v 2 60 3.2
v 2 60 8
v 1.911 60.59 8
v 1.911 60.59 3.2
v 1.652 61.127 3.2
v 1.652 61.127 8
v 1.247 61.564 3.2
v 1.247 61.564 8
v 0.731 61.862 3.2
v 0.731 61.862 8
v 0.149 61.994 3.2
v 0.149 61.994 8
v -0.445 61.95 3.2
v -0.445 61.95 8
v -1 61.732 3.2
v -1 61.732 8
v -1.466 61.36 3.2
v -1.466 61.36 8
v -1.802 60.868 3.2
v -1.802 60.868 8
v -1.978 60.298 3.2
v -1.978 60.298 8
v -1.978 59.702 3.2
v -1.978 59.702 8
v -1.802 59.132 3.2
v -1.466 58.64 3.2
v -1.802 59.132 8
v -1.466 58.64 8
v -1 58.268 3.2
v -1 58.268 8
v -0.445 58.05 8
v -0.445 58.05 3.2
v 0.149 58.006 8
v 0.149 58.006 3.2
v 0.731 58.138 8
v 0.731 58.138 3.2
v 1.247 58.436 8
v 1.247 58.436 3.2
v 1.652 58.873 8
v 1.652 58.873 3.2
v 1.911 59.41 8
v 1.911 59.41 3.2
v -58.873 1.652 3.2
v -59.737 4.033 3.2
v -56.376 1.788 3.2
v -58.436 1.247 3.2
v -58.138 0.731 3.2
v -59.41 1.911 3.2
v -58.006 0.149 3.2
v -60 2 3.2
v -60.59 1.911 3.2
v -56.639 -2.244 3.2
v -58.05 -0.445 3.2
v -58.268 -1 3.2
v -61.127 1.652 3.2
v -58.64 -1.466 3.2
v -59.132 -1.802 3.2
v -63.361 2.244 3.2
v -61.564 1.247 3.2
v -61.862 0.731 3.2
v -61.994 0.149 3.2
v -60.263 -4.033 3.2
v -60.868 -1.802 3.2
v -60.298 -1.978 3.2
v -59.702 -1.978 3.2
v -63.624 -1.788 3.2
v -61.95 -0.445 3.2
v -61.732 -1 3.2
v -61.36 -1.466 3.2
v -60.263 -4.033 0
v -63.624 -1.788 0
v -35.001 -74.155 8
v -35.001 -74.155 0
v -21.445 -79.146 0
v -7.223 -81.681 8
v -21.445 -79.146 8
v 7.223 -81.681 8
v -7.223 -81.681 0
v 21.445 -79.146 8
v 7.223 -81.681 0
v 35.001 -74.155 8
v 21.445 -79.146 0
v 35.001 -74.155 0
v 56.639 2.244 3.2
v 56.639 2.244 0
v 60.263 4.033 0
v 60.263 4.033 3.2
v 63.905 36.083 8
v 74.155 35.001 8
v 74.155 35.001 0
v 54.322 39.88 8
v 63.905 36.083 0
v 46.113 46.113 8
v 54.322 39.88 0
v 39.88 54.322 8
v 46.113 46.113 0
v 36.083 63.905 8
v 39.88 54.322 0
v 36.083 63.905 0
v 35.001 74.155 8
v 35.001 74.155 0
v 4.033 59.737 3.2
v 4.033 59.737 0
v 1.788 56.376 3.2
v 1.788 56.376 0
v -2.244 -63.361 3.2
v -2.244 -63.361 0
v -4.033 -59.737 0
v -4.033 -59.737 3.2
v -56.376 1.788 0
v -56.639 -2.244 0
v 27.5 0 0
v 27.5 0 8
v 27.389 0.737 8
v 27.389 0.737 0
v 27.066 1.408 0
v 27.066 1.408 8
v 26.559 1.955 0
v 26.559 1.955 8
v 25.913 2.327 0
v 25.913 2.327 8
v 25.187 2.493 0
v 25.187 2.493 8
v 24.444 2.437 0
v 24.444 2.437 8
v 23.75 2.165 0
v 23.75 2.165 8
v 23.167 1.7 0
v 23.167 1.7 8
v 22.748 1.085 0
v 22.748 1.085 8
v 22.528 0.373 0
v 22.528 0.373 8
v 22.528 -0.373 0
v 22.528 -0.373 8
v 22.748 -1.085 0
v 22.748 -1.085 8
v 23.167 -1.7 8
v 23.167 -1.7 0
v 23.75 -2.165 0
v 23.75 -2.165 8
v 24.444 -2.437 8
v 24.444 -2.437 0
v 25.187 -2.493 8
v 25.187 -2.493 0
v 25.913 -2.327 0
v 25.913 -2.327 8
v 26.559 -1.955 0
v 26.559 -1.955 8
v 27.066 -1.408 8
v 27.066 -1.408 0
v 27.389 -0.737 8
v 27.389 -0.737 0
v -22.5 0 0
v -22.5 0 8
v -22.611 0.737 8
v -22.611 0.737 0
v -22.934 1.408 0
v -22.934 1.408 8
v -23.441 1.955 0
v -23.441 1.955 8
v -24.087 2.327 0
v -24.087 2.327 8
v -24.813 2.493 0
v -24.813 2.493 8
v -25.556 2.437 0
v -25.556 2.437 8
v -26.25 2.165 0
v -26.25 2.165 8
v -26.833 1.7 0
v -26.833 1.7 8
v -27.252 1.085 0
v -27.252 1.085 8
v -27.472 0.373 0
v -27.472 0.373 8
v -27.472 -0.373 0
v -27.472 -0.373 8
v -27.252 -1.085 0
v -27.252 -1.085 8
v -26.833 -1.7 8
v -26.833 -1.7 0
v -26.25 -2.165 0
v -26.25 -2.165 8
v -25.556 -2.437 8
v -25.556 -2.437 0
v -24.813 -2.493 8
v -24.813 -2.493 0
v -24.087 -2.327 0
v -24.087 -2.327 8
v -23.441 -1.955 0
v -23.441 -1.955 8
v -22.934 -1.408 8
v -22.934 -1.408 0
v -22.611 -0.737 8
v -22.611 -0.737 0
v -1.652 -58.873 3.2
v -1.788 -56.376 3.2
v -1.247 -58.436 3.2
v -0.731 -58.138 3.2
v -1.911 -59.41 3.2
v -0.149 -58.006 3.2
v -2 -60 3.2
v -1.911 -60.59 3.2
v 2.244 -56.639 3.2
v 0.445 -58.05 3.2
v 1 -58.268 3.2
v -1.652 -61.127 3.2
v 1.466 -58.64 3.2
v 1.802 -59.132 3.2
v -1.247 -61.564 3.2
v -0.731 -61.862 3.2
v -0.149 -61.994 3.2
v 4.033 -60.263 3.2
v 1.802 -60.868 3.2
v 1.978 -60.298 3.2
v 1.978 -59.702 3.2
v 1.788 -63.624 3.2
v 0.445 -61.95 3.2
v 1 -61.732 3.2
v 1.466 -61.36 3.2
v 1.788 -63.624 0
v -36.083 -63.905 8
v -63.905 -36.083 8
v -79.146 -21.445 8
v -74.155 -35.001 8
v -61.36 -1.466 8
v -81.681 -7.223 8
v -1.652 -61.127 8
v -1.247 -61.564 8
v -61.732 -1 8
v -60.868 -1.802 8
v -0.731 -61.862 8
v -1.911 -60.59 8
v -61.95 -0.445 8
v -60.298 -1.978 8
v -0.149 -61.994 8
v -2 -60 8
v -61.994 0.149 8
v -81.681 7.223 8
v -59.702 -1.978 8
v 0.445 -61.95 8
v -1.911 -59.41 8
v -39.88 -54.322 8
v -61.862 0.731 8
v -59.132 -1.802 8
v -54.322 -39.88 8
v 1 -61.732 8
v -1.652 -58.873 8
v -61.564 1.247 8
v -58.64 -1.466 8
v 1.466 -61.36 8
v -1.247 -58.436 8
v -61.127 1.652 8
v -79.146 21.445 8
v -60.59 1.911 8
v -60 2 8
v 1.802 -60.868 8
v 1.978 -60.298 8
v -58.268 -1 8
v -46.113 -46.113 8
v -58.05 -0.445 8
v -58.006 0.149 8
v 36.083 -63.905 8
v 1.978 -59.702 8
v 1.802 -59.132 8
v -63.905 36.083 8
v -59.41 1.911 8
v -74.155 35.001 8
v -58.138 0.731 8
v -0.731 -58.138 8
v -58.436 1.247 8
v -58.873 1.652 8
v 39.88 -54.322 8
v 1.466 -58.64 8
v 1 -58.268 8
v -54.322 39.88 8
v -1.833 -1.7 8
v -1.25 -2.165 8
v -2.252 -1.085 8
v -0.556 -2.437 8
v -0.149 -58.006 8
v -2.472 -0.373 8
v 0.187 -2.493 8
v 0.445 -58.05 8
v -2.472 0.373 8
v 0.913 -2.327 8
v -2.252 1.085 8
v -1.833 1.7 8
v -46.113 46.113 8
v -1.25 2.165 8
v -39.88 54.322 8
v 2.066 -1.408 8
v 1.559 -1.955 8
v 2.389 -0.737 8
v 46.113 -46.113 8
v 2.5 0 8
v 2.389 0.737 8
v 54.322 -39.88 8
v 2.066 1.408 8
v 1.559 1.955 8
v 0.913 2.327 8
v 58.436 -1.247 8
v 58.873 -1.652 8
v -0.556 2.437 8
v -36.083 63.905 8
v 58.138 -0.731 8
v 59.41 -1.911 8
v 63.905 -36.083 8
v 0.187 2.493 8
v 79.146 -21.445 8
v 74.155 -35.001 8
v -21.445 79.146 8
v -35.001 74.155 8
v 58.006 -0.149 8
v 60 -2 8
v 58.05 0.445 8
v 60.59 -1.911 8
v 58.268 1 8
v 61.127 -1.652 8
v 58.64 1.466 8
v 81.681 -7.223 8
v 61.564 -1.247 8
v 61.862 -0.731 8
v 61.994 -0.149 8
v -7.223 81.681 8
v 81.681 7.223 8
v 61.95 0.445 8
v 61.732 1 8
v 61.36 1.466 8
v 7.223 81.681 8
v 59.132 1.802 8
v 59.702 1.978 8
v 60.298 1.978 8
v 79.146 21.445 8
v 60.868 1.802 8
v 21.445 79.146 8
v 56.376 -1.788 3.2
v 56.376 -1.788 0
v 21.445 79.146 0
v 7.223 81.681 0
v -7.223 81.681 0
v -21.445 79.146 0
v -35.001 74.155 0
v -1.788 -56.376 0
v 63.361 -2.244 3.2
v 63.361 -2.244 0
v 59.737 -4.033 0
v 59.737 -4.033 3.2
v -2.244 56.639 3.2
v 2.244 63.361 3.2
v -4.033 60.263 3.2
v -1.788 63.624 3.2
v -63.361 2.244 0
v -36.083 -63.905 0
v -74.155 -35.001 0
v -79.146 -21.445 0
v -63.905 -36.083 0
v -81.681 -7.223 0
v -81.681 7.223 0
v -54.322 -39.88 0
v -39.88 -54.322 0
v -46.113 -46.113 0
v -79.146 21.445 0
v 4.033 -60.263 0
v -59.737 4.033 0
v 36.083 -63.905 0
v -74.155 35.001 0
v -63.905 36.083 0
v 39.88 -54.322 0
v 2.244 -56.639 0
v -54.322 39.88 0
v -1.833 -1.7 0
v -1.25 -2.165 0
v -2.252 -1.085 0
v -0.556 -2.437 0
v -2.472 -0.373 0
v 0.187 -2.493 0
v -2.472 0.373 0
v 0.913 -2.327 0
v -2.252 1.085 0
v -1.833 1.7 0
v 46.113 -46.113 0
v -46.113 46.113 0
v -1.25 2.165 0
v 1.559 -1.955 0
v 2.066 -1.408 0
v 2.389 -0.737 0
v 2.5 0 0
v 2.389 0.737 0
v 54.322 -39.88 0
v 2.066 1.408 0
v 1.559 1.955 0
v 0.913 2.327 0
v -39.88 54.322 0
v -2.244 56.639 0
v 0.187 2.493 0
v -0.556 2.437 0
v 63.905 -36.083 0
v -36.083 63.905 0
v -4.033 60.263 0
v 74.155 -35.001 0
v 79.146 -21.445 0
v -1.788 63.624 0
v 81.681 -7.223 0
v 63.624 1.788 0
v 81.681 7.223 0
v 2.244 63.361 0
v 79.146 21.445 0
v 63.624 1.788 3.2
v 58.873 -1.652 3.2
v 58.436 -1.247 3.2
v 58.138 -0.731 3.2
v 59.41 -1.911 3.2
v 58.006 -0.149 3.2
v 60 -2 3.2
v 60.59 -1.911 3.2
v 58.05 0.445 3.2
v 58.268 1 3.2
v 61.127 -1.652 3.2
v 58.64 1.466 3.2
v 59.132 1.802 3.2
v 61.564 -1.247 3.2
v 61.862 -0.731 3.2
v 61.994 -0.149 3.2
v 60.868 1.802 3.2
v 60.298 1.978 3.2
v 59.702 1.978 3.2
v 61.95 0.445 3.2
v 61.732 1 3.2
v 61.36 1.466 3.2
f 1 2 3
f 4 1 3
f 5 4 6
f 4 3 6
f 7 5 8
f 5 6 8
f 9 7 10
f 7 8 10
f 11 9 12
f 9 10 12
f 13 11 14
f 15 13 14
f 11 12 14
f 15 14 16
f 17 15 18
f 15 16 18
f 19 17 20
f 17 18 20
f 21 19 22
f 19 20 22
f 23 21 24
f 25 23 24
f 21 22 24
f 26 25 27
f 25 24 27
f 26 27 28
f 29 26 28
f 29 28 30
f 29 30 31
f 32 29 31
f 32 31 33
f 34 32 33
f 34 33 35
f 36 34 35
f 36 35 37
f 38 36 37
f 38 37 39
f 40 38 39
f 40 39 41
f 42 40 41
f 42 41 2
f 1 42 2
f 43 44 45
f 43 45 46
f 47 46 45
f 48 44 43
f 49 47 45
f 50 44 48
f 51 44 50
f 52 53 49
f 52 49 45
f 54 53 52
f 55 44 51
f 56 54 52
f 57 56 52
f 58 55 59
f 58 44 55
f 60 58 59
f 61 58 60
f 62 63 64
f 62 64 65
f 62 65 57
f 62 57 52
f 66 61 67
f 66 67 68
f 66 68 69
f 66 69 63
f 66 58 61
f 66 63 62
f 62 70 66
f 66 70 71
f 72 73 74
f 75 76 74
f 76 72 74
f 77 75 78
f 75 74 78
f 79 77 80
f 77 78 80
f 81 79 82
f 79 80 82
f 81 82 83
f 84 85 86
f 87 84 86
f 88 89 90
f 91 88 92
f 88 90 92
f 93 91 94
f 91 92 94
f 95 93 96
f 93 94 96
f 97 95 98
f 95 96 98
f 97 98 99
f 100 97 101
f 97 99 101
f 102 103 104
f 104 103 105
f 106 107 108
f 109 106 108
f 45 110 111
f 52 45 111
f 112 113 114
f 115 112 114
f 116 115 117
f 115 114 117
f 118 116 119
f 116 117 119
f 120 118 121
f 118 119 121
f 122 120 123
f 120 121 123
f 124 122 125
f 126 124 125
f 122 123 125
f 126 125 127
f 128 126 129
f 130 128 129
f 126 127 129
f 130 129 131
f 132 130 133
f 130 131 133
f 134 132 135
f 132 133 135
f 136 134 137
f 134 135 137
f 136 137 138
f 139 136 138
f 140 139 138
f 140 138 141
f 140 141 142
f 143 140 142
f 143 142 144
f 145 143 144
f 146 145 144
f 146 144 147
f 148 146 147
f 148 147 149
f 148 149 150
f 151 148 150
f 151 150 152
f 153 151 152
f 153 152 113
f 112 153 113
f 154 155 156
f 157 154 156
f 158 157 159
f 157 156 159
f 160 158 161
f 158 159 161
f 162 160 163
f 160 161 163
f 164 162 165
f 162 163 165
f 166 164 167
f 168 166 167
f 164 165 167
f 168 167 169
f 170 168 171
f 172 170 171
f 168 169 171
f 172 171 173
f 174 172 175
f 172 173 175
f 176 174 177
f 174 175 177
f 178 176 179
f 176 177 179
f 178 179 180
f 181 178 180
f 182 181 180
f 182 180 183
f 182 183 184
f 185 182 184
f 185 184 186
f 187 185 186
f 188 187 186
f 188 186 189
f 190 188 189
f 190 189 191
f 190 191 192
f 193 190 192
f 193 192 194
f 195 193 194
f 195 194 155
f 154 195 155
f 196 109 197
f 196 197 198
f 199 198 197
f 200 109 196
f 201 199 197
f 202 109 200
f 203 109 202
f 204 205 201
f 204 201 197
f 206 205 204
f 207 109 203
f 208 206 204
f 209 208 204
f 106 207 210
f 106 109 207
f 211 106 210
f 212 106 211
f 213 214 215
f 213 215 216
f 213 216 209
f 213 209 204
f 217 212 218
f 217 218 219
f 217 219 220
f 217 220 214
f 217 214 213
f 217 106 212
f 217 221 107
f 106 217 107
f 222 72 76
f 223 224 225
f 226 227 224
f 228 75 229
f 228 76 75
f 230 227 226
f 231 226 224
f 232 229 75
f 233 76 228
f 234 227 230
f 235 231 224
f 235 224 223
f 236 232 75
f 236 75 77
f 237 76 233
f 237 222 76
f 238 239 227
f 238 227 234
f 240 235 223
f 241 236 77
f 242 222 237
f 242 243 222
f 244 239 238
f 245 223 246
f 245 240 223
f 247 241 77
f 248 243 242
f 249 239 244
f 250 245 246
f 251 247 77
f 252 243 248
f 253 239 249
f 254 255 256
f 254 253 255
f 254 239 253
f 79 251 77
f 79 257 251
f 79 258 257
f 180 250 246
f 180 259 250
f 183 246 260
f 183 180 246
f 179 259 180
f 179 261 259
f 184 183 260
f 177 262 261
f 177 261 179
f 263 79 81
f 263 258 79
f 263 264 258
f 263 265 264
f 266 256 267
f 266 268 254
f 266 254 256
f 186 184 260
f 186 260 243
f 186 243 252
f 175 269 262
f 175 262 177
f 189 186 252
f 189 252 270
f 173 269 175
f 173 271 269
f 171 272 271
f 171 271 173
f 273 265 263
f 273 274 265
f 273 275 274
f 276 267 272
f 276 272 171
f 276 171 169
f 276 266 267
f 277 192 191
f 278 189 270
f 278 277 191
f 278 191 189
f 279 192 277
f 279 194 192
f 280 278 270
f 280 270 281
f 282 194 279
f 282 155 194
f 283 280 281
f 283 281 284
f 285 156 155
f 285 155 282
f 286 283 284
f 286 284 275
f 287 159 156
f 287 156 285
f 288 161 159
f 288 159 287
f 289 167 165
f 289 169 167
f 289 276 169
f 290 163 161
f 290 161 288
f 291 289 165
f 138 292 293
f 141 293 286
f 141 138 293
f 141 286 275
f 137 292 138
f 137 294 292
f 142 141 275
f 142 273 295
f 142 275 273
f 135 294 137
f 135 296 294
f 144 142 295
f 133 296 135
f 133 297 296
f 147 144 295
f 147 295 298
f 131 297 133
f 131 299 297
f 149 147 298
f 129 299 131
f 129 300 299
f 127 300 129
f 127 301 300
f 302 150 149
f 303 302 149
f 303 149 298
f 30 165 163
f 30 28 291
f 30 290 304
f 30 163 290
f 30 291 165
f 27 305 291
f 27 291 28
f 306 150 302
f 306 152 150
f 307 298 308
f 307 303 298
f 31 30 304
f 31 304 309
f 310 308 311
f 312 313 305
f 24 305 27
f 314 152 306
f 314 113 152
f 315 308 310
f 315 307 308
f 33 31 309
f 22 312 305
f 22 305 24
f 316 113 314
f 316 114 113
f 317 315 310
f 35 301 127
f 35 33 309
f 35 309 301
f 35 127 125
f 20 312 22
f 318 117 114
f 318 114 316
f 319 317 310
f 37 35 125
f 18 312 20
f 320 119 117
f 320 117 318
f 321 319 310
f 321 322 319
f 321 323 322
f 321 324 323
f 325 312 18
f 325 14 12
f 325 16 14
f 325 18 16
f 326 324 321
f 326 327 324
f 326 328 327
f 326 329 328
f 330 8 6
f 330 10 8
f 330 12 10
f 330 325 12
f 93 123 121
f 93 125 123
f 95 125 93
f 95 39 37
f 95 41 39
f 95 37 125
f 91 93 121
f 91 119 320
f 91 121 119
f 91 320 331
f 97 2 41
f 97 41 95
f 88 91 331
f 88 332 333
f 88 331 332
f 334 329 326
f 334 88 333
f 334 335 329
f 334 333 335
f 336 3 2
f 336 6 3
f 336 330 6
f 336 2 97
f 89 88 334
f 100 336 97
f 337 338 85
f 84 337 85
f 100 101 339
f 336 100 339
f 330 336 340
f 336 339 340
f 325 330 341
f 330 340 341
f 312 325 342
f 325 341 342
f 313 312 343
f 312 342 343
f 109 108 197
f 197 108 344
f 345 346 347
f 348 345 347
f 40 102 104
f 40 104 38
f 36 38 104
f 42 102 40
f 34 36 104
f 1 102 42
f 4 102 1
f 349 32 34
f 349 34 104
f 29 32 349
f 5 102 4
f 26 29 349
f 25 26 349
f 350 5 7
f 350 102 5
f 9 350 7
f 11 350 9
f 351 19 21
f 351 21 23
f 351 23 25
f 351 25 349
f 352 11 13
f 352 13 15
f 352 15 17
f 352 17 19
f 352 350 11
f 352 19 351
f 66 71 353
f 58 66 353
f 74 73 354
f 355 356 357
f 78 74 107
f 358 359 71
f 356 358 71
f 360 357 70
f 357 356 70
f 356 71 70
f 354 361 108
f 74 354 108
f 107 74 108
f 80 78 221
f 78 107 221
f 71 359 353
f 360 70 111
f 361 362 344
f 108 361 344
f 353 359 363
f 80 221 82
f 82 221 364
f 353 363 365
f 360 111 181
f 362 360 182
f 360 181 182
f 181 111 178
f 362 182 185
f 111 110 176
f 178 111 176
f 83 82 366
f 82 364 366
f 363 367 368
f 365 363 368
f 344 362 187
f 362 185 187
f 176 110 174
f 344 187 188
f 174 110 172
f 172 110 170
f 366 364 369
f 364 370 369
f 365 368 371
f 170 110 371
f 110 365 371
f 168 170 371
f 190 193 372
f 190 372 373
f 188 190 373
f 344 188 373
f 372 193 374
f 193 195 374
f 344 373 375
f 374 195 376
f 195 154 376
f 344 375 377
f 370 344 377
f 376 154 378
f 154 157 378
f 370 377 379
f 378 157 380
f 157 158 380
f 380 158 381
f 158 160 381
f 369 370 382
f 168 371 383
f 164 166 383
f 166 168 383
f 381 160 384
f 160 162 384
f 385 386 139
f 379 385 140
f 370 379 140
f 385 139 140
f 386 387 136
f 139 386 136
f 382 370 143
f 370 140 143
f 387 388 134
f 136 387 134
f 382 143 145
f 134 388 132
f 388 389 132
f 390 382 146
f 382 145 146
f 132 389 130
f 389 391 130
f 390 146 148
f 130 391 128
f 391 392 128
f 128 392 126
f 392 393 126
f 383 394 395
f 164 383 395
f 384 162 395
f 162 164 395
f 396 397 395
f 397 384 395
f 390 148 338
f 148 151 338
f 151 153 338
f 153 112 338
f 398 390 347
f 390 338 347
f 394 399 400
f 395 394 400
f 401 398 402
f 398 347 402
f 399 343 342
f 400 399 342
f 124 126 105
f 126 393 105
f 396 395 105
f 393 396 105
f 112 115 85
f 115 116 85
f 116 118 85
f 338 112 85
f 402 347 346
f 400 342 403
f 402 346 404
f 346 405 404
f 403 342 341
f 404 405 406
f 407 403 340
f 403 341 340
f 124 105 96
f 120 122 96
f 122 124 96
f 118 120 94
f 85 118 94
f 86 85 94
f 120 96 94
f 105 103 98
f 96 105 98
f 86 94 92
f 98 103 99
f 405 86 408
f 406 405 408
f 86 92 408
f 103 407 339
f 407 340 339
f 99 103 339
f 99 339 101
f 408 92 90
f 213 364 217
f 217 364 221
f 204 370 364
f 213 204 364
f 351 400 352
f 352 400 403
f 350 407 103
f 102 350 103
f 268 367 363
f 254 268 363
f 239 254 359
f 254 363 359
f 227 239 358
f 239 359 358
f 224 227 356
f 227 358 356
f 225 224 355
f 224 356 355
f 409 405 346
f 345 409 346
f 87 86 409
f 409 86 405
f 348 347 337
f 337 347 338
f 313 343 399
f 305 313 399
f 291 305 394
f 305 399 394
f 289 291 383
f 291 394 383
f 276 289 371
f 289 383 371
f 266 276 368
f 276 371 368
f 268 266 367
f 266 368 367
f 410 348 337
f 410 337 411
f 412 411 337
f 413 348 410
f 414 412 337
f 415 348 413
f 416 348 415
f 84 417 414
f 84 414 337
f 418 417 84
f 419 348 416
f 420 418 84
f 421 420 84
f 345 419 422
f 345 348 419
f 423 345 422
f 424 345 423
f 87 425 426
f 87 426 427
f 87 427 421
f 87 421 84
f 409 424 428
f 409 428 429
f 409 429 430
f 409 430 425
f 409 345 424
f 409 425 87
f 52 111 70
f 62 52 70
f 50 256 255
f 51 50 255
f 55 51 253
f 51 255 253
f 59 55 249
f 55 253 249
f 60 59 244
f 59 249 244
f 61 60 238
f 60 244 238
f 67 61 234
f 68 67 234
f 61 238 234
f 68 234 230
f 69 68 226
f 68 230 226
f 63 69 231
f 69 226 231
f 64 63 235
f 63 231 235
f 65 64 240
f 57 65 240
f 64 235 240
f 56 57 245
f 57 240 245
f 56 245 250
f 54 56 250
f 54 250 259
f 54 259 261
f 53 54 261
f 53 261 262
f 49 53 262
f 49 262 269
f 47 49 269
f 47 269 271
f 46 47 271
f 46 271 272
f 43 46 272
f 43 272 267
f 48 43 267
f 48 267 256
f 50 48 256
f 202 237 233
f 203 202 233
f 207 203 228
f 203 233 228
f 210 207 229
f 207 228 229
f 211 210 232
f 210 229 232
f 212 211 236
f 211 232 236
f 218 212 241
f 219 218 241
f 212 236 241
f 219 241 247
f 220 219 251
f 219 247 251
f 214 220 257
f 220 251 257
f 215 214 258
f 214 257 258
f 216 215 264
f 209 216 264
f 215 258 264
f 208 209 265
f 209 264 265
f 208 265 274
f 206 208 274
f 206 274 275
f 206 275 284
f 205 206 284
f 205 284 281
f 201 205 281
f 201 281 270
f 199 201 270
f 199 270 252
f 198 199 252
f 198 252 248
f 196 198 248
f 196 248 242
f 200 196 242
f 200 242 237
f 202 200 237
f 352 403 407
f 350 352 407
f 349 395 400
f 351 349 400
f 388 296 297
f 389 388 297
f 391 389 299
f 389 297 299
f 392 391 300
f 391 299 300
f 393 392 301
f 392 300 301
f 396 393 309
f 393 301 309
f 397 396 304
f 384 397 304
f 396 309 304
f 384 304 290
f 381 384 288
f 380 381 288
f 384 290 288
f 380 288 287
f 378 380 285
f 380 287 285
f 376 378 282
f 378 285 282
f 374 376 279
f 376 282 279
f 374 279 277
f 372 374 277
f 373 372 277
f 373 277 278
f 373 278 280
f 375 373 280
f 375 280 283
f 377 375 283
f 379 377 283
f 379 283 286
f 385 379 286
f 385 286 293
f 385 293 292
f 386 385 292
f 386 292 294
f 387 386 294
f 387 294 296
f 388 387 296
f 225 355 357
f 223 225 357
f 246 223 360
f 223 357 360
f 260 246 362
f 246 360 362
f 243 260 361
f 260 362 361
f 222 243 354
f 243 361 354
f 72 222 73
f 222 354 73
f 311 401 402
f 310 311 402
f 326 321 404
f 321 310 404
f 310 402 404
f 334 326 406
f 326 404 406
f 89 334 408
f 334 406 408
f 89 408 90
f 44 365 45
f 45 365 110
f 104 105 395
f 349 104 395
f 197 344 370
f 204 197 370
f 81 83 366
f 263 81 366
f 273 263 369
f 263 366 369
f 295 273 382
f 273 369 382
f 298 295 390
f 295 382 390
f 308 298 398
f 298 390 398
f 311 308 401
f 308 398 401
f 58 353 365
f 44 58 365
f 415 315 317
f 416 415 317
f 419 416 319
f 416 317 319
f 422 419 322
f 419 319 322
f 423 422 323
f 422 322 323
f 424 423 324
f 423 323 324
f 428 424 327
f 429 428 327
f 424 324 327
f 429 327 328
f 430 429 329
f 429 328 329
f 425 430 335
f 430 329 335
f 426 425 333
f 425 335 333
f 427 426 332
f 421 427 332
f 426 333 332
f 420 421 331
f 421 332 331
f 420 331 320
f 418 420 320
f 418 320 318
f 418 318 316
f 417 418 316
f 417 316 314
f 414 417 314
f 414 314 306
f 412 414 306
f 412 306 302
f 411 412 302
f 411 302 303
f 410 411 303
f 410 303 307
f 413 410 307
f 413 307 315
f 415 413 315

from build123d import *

# Parameters (mm, degrees)
SKETCH1_R           = 82
BOSS_EXTRUDE1_DEPTH = 8
SKETCH2_R           = 2
CUT_EXTRUDE1_DEPTH  = 15
CIRPATTERN2_COUNT   = 4
CUT_EXTRUDE3_DEPTH  = 3.2
CIRPATTERN3_COUNT   = 4
SKETCH10_R          = 2.5
CUT_EXTRUDE4_DEPTH  = 10
CUT_EXTRUDE5_START  = -10
CUT_EXTRUDE5_DEPTH  = 10
CIRPATTERN4_COUNT   = 4


with BuildPart() as part:
    # Sketch1 → Boss-Extrude1 (new body)
    with BuildSketch(Plane.XY):
        Circle(SKETCH1_R)
    extrude(amount=BOSS_EXTRUDE1_DEPTH)

    # Sketch2 → Cut-Extrude1 (cut)
    with BuildSketch(Plane.XY.offset(8)):
        with Locations((0, 60)):
            Circle(SKETCH2_R)
    cut_extrude1 = extrude(amount=-CUT_EXTRUDE1_DEPTH, mode=Mode.SUBTRACT)

    # CirPattern2: Cut-Extrude1 ×4 about axis
    cirpattern2_axis = Axis((0, 0, 0), (0, 0, 1))
    for i in range(1, CIRPATTERN2_COUNT):
        add(cut_extrude1.rotate(cirpattern2_axis, i * 360 / CIRPATTERN2_COUNT), mode=Mode.SUBTRACT)

    # Sketch7 → Cut-Extrude3 (cut)
    with BuildSketch(Plane(origin=(0, 0, 0), x_dir=(-1, 0, 0), z_dir=(0, 0, -1))):
        Polygon((1.788462671, 63.624187441), (-2.244407056, 63.360947827), (-4.032869728, 59.736760386), (-1.788462671, 56.375812559), (2.244407056, 56.639052173), (4.032869728, 60.263239614), align=None)
    cut_extrude3 = extrude(amount=-CUT_EXTRUDE3_DEPTH, mode=Mode.SUBTRACT)

    # CirPattern3: Cut-Extrude3 ×4 about axis
    cirpattern3_axis = Axis((0, 0, 0), (0, 0, 1))
    for i in range(1, CIRPATTERN3_COUNT):
        add(cut_extrude3.rotate(cirpattern3_axis, i * 360 / CIRPATTERN3_COUNT), mode=Mode.SUBTRACT)

    # Sketch10 → Cut-Extrude4 (cut)
    with BuildSketch(Plane.XY.offset(8)):
        Circle(SKETCH10_R)
        with Locations((25, 0)):
            Circle(SKETCH10_R)
        with Locations((-25, 0)):
            Circle(SKETCH10_R)
    extrude(amount=-CUT_EXTRUDE4_DEPTH, mode=Mode.SUBTRACT)

    # Sketch11 → Cut-Extrude5 (cut)
    with BuildSketch(Plane.XY.offset(8).offset(CUT_EXTRUDE5_START)):
        with BuildLine():
            ThreePointArc((-35.000836658, 74.154847672), (-46.112698372, 46.112698372), (-74.154847672, 35.000836658))
            ThreePointArc((-74.154847672, 35.000836658), (-57.982756057, 57.982756057), (-35.000836658, 74.154847672))
        make_face()
    cut_extrude5 = extrude(amount=CUT_EXTRUDE5_DEPTH, mode=Mode.SUBTRACT)

    # CirPattern4: Cut-Extrude5 ×4 about axis
    cirpattern4_axis = Axis((0, 0, 0), (0, 0, 1))
    for i in range(1, CIRPATTERN4_COUNT):
        add(cut_extrude5.rotate(cirpattern4_axis, i * 360 / CIRPATTERN4_COUNT), mode=Mode.SUBTRACT)


solid = part.part
